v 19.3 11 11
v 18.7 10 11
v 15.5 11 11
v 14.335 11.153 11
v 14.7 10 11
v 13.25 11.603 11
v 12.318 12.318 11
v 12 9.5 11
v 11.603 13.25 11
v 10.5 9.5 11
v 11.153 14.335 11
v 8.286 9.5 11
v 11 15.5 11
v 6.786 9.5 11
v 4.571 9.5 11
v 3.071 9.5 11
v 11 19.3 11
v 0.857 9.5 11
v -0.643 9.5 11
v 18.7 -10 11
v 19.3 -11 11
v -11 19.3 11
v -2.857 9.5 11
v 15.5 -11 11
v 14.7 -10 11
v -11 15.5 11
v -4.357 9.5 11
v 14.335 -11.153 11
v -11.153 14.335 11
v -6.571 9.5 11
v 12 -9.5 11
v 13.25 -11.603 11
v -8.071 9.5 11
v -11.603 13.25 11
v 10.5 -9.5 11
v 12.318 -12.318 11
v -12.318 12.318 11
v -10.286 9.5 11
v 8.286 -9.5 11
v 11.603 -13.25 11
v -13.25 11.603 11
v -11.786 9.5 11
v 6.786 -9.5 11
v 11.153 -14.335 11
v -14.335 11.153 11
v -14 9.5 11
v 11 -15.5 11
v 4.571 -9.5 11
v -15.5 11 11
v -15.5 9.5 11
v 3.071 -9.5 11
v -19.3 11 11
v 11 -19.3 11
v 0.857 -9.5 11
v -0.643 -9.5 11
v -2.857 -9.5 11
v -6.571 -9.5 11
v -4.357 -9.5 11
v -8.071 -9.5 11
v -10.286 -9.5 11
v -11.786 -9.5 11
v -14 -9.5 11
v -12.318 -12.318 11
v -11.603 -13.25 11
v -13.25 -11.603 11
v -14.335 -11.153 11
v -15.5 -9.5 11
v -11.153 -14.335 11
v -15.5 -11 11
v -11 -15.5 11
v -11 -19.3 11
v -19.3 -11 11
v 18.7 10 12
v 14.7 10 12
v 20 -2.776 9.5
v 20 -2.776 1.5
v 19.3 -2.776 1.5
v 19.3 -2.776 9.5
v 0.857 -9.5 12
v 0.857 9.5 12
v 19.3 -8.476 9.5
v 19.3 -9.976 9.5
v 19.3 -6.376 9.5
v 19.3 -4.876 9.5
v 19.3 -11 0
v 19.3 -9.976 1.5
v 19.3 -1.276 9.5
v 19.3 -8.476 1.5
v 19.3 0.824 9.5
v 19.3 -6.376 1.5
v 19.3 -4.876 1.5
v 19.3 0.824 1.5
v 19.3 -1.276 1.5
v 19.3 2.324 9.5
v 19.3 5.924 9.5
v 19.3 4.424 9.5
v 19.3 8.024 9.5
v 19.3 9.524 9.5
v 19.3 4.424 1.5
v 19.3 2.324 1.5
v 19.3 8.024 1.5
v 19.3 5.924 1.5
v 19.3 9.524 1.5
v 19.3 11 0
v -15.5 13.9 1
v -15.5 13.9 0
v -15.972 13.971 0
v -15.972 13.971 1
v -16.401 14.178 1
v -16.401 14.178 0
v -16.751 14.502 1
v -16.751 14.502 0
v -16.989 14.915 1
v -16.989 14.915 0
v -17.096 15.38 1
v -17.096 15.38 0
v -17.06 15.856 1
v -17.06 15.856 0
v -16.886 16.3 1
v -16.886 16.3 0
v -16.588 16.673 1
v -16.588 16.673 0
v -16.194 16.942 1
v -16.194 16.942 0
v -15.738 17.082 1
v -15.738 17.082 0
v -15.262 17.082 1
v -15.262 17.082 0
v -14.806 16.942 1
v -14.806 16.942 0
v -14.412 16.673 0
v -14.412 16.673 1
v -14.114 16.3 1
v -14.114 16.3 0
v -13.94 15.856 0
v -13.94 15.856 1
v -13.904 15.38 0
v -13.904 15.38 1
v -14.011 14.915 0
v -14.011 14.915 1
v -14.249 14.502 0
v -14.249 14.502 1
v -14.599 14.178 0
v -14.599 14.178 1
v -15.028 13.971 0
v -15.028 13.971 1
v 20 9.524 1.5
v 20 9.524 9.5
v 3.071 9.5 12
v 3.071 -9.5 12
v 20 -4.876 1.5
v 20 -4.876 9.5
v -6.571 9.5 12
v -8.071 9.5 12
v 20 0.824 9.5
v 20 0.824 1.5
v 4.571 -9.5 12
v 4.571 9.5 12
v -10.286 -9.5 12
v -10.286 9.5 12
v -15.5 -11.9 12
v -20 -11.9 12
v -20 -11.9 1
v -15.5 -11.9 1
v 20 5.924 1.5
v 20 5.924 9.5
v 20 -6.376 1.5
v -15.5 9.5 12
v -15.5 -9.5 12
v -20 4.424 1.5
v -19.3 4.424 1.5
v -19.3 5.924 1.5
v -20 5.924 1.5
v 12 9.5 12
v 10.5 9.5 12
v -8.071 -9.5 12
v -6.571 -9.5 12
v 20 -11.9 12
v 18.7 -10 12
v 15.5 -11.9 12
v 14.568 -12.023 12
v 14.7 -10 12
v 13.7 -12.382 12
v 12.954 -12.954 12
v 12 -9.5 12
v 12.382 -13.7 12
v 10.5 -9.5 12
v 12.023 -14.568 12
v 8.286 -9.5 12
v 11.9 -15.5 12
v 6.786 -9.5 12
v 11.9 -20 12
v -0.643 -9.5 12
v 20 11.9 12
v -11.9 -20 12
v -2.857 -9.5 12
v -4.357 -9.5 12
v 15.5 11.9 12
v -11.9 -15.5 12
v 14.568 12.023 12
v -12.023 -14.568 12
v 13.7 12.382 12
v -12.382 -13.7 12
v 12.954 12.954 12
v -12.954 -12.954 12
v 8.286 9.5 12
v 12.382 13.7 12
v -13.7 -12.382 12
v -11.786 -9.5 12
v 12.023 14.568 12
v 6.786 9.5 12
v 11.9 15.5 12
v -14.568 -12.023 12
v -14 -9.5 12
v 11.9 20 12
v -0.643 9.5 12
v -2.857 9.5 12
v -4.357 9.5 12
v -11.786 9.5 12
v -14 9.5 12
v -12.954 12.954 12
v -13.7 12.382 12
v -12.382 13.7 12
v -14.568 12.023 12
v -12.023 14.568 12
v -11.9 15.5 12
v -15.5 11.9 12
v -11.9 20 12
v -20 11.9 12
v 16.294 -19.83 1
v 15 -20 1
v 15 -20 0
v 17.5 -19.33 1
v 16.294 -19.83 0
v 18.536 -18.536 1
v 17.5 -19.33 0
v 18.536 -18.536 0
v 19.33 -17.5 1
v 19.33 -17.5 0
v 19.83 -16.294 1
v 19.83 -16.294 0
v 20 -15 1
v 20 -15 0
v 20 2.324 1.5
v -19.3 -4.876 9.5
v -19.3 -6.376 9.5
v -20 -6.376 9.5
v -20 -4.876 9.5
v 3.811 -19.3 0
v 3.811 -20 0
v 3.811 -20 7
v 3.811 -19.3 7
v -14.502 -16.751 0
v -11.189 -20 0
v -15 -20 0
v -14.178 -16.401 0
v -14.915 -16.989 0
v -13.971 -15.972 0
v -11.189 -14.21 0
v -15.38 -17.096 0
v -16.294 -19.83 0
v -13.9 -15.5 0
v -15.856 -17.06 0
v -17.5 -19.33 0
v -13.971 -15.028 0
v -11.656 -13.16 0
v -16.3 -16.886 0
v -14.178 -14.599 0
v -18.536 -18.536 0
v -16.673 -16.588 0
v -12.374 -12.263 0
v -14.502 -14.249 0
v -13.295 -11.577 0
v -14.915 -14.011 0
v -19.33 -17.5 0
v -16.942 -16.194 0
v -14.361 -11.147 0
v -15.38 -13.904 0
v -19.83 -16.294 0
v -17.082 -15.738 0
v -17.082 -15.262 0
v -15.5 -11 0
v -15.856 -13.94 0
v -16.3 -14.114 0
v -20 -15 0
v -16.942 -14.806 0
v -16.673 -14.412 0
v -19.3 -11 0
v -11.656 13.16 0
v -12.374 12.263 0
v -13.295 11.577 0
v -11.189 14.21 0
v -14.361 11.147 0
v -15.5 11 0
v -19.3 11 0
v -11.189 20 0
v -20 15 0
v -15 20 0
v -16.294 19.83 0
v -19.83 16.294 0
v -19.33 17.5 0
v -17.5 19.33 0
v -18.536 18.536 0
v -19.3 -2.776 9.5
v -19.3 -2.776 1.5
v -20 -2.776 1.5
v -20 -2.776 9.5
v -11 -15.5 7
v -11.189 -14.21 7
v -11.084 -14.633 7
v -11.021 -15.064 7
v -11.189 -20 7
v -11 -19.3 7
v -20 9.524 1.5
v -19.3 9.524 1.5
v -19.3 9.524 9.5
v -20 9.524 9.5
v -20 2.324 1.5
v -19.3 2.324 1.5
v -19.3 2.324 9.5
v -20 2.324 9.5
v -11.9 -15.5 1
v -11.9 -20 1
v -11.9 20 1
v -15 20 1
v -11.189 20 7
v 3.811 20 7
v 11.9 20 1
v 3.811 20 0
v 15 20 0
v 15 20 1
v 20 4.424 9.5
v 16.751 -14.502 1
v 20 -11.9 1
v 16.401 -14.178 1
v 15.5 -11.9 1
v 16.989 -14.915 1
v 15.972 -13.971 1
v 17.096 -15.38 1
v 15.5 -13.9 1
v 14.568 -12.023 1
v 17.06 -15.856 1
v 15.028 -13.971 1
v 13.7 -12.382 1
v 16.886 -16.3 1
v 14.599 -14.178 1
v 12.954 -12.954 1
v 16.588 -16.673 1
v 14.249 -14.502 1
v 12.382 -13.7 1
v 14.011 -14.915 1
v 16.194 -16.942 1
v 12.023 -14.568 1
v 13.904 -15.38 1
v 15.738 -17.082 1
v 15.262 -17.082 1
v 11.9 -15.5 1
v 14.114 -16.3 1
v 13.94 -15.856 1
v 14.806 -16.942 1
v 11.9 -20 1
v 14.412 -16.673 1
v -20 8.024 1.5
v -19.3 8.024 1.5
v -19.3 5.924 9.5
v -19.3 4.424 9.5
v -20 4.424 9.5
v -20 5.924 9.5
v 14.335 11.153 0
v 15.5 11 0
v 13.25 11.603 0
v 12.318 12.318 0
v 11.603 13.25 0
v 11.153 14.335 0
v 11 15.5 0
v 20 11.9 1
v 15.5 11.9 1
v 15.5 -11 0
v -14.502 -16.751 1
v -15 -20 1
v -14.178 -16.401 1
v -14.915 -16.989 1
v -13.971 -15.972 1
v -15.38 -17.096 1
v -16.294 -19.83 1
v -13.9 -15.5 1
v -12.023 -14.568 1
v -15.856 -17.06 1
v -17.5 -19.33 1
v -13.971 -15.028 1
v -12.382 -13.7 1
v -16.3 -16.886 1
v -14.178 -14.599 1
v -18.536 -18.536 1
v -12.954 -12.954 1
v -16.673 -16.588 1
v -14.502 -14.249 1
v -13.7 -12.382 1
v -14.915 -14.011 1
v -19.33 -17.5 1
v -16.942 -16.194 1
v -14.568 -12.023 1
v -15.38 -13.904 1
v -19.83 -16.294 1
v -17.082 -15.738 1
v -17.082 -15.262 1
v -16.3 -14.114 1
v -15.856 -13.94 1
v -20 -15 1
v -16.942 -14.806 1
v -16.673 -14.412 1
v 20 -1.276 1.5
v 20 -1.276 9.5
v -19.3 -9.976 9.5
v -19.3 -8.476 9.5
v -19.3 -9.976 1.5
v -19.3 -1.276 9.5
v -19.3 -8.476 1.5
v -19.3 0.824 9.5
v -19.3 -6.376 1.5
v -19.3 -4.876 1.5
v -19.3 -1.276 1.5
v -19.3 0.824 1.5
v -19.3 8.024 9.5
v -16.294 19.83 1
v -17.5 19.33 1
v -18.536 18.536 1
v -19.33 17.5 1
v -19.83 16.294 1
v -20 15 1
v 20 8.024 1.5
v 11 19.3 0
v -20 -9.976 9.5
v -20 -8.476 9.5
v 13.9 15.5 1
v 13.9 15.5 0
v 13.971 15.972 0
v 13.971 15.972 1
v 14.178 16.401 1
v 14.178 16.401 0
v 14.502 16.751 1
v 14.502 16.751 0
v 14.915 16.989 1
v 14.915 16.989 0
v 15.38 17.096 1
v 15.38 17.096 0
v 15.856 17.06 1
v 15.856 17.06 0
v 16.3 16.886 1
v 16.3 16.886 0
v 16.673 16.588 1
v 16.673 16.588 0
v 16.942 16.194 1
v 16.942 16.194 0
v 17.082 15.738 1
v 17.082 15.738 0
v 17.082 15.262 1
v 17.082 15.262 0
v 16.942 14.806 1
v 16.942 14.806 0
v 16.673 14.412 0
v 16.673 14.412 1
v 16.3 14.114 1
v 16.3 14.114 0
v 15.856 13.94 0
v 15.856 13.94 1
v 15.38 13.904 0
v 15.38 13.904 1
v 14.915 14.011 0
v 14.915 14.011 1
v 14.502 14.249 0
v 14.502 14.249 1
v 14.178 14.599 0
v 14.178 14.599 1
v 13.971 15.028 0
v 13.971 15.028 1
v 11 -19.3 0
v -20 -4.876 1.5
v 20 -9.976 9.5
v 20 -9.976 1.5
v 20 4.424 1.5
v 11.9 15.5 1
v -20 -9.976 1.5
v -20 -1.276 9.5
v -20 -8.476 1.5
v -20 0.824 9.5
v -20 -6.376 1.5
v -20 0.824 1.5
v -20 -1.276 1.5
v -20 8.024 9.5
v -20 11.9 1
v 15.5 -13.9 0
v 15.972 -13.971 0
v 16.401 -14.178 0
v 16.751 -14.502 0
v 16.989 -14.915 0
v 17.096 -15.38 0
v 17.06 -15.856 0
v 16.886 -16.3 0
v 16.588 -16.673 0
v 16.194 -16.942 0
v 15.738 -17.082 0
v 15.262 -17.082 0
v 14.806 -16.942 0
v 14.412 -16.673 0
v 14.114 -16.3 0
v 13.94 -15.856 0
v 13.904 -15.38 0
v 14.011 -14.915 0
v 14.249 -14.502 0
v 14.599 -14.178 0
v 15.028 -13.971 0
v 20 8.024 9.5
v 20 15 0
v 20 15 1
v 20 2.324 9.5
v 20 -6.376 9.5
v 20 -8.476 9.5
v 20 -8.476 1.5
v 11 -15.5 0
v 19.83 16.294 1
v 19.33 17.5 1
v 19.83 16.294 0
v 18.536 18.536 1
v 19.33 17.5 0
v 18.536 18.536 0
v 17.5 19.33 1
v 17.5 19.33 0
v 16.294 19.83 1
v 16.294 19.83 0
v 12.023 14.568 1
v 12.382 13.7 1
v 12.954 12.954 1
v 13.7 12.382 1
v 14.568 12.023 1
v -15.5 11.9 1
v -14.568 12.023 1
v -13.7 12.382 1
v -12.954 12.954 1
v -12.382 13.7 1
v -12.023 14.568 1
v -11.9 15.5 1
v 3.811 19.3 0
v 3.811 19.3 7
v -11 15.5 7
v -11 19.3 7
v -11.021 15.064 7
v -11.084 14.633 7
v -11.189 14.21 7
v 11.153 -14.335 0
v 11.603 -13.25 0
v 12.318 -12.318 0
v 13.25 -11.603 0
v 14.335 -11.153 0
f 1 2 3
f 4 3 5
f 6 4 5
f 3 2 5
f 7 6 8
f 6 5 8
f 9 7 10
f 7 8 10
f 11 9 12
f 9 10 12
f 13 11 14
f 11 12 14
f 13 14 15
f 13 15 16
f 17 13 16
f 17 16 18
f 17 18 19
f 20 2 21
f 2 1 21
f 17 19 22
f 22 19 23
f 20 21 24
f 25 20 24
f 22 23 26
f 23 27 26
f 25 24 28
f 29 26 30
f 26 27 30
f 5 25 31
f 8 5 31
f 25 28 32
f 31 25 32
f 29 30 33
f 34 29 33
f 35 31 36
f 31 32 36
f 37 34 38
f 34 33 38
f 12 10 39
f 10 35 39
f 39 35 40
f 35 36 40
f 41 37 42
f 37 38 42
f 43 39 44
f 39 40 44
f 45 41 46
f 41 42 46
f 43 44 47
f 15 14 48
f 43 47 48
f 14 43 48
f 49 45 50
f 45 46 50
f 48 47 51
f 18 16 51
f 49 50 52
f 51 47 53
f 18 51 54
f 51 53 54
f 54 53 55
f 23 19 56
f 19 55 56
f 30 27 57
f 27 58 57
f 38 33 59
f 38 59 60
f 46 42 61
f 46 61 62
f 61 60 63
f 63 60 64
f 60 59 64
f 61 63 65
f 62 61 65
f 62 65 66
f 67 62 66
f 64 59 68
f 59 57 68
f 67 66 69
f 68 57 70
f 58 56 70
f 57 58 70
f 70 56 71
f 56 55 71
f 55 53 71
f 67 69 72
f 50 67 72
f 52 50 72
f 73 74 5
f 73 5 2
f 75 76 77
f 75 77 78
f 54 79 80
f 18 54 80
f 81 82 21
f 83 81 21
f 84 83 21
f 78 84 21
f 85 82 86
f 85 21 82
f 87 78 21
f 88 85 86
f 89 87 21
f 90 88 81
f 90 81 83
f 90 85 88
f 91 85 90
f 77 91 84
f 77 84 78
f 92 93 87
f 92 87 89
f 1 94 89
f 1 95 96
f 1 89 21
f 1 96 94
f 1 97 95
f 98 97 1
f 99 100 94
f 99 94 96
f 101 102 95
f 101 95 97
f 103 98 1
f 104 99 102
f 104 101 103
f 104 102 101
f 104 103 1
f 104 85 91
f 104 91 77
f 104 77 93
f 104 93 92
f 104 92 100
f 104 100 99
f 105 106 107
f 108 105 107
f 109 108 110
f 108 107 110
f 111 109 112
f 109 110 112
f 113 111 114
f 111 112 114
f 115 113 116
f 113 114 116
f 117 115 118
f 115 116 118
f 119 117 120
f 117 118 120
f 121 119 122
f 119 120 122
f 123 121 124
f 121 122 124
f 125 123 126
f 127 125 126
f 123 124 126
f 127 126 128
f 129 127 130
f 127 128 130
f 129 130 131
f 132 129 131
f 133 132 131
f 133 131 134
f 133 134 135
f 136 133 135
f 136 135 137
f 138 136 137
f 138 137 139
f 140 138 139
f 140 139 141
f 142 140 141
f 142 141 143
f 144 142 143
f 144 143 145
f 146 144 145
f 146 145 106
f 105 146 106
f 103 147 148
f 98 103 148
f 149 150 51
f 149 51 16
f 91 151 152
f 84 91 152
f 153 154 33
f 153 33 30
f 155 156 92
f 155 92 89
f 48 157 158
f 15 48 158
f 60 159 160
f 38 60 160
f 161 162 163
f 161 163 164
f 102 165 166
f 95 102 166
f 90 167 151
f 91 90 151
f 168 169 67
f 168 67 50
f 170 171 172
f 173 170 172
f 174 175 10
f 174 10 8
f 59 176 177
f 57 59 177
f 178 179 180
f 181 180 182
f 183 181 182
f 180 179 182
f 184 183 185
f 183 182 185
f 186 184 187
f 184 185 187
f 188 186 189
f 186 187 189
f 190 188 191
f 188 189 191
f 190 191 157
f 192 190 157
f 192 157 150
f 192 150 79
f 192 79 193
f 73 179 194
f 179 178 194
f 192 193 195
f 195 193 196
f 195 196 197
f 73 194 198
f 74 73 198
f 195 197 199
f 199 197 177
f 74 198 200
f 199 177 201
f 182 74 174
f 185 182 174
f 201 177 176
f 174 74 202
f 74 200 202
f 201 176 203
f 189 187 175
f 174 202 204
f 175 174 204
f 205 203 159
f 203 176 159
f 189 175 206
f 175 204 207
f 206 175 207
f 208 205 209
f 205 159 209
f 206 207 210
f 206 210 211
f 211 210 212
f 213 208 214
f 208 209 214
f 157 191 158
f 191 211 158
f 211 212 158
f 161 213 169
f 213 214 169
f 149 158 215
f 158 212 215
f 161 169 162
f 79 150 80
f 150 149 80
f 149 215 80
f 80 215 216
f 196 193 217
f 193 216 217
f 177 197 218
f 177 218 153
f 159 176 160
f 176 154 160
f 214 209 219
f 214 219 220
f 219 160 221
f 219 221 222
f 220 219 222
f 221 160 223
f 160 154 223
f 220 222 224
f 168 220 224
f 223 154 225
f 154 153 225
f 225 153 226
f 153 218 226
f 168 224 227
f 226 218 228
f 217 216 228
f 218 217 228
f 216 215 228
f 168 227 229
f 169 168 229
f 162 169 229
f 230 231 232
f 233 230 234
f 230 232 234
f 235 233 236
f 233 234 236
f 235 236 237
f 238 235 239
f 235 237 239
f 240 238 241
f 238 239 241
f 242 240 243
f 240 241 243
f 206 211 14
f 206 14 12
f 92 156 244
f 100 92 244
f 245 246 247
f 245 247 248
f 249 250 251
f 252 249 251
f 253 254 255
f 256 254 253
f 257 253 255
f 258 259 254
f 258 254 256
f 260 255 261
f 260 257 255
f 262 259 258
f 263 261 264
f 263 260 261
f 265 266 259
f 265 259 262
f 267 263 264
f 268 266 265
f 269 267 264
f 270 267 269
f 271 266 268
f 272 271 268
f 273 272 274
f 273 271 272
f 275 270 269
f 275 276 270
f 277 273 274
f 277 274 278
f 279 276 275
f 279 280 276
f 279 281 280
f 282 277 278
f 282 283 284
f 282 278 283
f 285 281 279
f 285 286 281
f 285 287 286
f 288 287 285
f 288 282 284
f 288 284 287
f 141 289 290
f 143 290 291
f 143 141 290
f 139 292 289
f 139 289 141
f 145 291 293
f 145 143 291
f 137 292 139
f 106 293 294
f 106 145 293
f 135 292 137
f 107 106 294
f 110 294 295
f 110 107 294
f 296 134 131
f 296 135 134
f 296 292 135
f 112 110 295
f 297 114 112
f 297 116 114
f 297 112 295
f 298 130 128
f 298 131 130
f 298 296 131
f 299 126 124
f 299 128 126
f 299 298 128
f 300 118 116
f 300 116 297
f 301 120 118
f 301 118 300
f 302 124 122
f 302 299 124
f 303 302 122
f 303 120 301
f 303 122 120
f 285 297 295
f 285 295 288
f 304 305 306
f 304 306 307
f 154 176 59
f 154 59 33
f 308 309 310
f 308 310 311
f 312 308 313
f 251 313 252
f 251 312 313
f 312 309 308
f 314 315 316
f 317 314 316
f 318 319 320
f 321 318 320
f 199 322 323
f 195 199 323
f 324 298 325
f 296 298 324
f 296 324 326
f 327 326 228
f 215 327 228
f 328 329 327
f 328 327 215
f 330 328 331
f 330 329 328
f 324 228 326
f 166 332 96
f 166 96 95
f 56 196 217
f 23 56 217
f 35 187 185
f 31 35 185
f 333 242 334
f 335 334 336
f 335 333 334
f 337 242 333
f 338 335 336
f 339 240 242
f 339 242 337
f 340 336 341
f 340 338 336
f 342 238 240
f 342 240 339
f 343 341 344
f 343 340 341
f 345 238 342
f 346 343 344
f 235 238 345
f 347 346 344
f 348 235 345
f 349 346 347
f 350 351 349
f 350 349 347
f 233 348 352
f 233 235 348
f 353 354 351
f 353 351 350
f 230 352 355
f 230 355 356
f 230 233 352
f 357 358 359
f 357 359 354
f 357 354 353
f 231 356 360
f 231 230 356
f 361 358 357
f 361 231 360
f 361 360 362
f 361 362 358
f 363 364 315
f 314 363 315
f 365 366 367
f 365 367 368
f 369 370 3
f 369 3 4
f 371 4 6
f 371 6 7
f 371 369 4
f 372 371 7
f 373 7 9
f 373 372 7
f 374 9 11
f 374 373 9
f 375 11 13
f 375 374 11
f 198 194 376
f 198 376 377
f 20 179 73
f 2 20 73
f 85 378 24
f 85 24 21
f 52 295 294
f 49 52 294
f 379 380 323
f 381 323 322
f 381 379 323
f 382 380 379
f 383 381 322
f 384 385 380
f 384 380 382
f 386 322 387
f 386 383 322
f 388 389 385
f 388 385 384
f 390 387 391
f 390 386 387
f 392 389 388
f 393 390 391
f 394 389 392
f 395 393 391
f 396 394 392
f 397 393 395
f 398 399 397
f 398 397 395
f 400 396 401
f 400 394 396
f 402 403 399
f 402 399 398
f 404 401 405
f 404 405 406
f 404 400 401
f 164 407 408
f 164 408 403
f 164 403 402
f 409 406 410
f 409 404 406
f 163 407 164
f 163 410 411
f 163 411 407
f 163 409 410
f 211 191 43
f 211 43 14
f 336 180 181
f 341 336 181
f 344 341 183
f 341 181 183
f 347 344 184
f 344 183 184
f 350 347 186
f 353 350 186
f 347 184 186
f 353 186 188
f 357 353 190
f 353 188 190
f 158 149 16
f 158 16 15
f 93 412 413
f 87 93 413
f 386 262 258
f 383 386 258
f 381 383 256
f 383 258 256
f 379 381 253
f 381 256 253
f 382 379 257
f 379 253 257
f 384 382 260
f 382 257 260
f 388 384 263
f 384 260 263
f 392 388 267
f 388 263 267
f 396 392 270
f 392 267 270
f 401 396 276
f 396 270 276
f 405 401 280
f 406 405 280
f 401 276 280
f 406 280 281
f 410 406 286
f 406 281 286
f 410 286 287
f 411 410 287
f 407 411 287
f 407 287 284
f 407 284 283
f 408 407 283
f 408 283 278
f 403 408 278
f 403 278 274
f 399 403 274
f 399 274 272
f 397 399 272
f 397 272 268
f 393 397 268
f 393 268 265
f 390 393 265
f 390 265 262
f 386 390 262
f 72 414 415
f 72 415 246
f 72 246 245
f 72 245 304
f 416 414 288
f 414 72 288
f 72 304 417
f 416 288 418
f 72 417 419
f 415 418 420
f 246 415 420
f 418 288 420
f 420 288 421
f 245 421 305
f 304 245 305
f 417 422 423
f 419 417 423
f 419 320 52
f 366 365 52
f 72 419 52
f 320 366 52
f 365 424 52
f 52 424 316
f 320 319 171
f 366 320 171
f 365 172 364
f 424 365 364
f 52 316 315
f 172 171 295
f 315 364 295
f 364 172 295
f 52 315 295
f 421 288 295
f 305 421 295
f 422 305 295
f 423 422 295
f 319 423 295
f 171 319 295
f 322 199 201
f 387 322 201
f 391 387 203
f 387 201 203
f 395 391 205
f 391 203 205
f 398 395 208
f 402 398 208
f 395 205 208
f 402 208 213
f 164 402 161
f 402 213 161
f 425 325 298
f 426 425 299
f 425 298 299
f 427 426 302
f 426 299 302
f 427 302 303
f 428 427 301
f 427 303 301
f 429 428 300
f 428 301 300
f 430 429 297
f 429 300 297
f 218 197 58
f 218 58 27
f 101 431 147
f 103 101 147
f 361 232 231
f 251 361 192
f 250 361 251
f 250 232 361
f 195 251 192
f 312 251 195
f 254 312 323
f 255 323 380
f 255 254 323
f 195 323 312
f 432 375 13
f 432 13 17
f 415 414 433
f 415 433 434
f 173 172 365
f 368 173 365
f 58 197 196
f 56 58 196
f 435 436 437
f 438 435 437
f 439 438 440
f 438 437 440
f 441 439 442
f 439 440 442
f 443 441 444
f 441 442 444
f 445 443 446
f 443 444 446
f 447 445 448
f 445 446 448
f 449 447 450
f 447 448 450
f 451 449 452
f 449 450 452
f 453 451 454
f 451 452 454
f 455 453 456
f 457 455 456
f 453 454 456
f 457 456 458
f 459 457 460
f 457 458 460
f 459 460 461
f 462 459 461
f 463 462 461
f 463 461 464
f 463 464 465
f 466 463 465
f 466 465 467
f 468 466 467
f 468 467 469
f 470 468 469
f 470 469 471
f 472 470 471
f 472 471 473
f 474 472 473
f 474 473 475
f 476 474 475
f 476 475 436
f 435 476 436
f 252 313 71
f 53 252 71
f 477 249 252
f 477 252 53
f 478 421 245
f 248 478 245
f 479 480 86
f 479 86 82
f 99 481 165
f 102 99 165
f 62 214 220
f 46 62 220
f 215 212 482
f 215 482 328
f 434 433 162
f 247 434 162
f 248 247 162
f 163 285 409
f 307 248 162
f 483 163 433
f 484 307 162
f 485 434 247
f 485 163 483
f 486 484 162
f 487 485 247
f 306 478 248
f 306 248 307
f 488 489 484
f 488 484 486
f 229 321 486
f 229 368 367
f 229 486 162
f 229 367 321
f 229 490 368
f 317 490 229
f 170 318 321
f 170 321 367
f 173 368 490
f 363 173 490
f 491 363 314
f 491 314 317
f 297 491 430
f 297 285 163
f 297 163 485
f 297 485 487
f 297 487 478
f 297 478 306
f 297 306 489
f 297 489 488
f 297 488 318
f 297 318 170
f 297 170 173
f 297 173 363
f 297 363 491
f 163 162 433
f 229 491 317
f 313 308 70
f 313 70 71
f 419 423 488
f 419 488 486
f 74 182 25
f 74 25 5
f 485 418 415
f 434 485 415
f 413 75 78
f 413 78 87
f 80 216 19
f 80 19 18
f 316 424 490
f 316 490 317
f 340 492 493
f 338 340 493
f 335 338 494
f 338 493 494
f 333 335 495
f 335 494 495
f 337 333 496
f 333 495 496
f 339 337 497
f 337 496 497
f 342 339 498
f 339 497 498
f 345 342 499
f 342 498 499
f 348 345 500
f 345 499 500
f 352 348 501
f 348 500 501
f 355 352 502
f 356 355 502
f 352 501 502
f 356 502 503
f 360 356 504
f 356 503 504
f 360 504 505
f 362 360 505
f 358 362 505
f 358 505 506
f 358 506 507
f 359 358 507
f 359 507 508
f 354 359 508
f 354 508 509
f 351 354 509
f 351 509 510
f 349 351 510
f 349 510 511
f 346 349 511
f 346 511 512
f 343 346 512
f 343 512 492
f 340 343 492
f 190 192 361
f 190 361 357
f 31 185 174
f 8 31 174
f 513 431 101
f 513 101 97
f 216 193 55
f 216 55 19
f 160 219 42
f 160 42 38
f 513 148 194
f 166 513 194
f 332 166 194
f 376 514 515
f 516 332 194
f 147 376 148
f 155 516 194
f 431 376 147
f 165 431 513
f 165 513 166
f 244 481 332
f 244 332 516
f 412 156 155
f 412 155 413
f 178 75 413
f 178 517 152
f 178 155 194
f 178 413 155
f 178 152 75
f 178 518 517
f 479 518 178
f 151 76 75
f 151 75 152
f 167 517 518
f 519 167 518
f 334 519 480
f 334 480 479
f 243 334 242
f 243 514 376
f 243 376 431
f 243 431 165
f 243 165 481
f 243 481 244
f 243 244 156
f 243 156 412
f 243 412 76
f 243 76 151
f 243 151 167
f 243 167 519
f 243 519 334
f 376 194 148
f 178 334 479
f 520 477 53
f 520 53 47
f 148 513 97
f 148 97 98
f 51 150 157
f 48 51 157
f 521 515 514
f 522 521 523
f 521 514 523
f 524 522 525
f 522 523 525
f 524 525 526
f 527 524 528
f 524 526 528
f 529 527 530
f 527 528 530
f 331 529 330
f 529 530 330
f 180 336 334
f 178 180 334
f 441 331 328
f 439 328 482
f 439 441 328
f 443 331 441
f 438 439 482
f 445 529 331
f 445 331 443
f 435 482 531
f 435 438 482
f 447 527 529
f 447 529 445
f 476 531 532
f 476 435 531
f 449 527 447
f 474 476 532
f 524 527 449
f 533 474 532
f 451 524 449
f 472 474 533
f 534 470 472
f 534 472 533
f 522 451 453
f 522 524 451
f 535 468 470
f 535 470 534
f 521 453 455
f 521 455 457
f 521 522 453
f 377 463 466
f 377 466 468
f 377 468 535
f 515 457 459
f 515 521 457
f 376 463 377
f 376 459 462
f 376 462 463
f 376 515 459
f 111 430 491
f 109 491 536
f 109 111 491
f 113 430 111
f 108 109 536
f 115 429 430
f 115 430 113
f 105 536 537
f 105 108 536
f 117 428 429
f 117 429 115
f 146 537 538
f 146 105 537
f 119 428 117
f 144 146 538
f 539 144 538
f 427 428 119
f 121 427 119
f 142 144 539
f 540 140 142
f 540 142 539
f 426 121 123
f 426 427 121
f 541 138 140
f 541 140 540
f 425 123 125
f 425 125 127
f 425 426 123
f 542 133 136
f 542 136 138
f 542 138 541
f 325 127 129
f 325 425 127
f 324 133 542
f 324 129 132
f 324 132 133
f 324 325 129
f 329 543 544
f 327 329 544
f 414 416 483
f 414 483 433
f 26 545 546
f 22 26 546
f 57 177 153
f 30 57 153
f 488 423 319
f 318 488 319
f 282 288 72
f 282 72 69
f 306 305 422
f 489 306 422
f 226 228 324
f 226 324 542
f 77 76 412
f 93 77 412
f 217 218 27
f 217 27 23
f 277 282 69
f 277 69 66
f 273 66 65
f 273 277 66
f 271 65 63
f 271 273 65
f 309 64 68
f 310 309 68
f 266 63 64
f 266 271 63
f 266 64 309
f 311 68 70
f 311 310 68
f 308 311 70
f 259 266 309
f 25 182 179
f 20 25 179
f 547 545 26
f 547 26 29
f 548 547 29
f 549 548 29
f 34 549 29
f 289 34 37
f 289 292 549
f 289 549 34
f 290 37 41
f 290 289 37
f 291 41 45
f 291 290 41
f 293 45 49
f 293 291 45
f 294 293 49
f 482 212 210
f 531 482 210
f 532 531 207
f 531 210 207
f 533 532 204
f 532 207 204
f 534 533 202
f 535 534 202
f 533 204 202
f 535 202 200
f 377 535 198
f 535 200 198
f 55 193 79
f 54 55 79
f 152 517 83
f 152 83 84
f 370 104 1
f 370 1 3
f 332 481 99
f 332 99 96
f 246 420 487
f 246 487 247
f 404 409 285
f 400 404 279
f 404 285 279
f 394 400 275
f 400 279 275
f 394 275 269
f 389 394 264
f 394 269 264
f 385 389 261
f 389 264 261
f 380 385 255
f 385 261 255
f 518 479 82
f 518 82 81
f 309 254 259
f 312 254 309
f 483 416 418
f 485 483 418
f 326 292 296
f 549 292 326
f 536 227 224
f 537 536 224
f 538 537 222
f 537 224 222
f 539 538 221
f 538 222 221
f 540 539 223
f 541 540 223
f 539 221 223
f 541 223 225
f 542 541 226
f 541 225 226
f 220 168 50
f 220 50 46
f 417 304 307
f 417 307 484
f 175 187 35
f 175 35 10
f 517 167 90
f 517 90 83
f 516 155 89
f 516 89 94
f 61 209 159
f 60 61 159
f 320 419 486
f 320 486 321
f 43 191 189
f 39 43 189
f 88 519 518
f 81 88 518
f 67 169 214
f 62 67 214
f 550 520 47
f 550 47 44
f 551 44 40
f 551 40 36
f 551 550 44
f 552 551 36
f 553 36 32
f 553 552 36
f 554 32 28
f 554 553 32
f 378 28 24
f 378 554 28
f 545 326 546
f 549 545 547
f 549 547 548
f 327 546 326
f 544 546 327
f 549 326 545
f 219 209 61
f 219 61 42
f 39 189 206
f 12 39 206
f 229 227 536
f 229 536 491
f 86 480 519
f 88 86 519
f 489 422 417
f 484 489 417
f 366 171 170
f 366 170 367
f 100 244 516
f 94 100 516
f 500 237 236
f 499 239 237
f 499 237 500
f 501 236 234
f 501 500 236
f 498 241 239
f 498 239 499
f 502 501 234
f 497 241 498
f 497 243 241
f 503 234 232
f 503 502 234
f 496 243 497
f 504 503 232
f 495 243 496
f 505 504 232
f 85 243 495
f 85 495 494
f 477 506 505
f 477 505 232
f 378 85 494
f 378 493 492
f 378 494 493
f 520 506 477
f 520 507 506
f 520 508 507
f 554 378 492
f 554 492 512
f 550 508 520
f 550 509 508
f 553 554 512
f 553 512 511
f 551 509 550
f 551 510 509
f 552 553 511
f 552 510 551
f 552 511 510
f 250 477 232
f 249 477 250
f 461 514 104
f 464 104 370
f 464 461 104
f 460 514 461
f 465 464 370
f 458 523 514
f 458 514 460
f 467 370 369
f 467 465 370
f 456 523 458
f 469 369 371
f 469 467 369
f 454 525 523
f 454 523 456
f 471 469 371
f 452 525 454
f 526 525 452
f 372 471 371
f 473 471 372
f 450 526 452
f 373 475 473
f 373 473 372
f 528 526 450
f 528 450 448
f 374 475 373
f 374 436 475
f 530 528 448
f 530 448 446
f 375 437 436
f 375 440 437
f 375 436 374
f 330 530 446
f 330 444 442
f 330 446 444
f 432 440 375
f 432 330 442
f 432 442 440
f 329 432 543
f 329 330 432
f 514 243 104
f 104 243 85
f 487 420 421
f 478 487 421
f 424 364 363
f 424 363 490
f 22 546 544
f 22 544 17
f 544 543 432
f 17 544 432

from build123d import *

# Parameters (mm, degrees)
PAD_DEPTH              = 12
POCKET_DEPTH           = 11
POCKET001_DEPTH        = 11
POLARPATTERN_COUNT     = 4
SKETCH003_R            = 1.6
POCKET002_DEPTH        = 127.655658
POLARPATTERN001_COUNT  = 4
SKETCH004_W            = 4
SKETCH004_H            = 20
POCKET003_DEPTH        = 12.001
SKETCH005_W            = 15
SKETCH005_H            = 7
POCKET004_DEPTH        = 40.001
SKETCH006_W            = 1.5
SKETCH006_H            = 8
POCKET005_DEPTH        = 40.001
LINEARPATTERN_COUNT    = 6
LINEARPATTERN_PITCH    = 3.6
SKETCH007_W            = 1.5
SKETCH007_H            = 19
POCKET006_DEPTH        = 12.001
LINEARPATTERN001_COUNT = 8
LINEARPATTERN001_PITCH = 3.714286


with BuildPart() as part:
    # Sketch → Pad (new body)
    with BuildSketch(Plane.XY):
        with BuildLine():
            Line((-15, 20), (15, 20))
            ThreePointArc((20, 15), (18.535534, 18.535534), (15, 20))
            Line((20, 15), (20, -15))
            ThreePointArc((15, -20), (18.535534, -18.535534), (20, -15))
            Line((15, -20), (-15, -20))
            ThreePointArc((-20, -15), (-18.535534, -18.535534), (-15, -20))
            Line((-20, -15), (-20, 15))
            ThreePointArc((-15, 20), (-18.535534, 18.535534), (-20, 15))
        make_face()
    extrude(amount=PAD_DEPTH)

    # Sketch001 (on Face9 of Pad) → Pocket (cut)
    with BuildSketch(Plane(origin=(0, 0, 0), x_dir=(1, 0, 0), z_dir=(0, 0, -1))):
        with BuildLine():
            ThreePointArc((-15.5, 11), (-12.318019, 12.318019), (-11, 15.5))
            Line((-11, 15.5), (-11, 19.3))
            Line((-11, 19.3), (11, 19.3))
            Line((11, 19.3), (11, 15.5))
            ThreePointArc((11, 15.5), (12.318019, 12.318019), (15.5, 11))
            Line((15.5, 11), (19.3, 11))
            Line((19.3, 11), (19.3, -11))
            Line((19.3, -11), (15.5, -11))
            ThreePointArc((15.5, -11), (12.318019, -12.318019), (11, -15.5))
            Line((11, -15.5), (11, -19.3))
            Line((-11, -19.3), (11, -19.3))
            Line((-11, -15.5), (-11, -19.3))
            ThreePointArc((-11, -15.5), (-12.318019, -12.318019), (-15.5, -11))
            Line((-19.3, -11), (-15.5, -11))
            Line((-19.3, 11), (-19.3, -11))
            Line((-19.3, 11), (-15.5, 11))
        make_face()
    extrude(amount=-POCKET_DEPTH, mode=Mode.SUBTRACT)

    # Sketch002 (on Face5 of Pocket) → Pocket001 (cut)
    with BuildSketch(Plane.XY.offset(12)):
        with BuildLine():
            ThreePointArc((-15.5, 11.9), (-12.954416, 12.954416), (-11.9, 15.5))
            Line((-11.9, 20.654364), (-11.9, 15.5))
            Line((-20.945524, 20.654364), (-11.9, 20.654364))
            Line((-20.945524, 11.9), (-20.945524, 20.654364))
            Line((-15.5, 11.9), (-20.945524, 11.9))
        make_face()
    pocket001 = extrude(amount=-POCKET001_DEPTH, mode=Mode.SUBTRACT)

    # PolarPattern: Pocket001 ×4 about axis
    polarpattern_axis = Axis((0, 0, 12), (0, 0, 1))
    for i in range(1, POLARPATTERN_COUNT):
        add(pocket001.rotate(polarpattern_axis, i * 360 / POLARPATTERN_COUNT), mode=Mode.SUBTRACT)

    # Sketch003 (on Face2 of PolarPattern) → Pocket002 (cut, through all)
    with BuildSketch(Plane(origin=(0, 0, 0), x_dir=(1, 0, 0), z_dir=(0, 0, -1))):
        with Locations((-15.5, 15.5)):
            Circle(SKETCH003_R)
    pocket002 = extrude(amount=-POCKET002_DEPTH, mode=Mode.SUBTRACT)

    # PolarPattern001: Pocket002 ×4 about axis
    polarpattern001_axis = Axis((0, 0, 0), (0, 0, -1))
    for i in range(1, POLARPATTERN001_COUNT):
        add(pocket002.rotate(polarpattern001_axis, i * 360 / POLARPATTERN001_COUNT), mode=Mode.SUBTRACT)

    # Sketch004 (on Face6 of PolarPattern001) → Pocket003 (cut, through all)
    with BuildSketch(Plane.XY.offset(12)):
        with Locations((16.7, 0)):
            Rectangle(SKETCH004_W, SKETCH004_H)
    extrude(amount=-POCKET003_DEPTH, mode=Mode.SUBTRACT)

    # Sketch005 (on Face10 of Pocket003) → Pocket004 (cut, through all)
    with BuildSketch(Plane.XZ.offset(20)):
        with Locations((-3.689, 3.5)):
            Rectangle(SKETCH005_W, SKETCH005_H)
    extrude(amount=-POCKET004_DEPTH, mode=Mode.SUBTRACT)

    # Sketch006 (on Face31 of Pocket004) → Pocket005 (cut, through all)
    with BuildSketch(Plane.YZ.offset(20)):
        with Locations((-9.225517, 5.5)):
            Rectangle(SKETCH006_W, SKETCH006_H)
    pocket005 = extrude(amount=-POCKET005_DEPTH, mode=Mode.SUBTRACT)

    # LinearPattern: Pocket005 ×6
    with Locations(*[(0, i * LINEARPATTERN_PITCH, 0) for i in range(1, LINEARPATTERN_COUNT)]):
        add(pocket005, mode=Mode.SUBTRACT)

    # Sketch007 (on Face9 of LinearPattern) → Pocket006 (cut, through all)
    with BuildSketch(Plane.XY.offset(12)):
        with Locations((-14.75, 0)):
            Rectangle(SKETCH007_W, SKETCH007_H)
    pocket006 = extrude(amount=-POCKET006_DEPTH, mode=Mode.SUBTRACT)

    # LinearPattern001: Pocket006 ×8
    with Locations(*[(i * LINEARPATTERN001_PITCH, 0, 0) for i in range(1, LINEARPATTERN001_COUNT)]):
        add(pocket006, mode=Mode.SUBTRACT)


solid = part.part
